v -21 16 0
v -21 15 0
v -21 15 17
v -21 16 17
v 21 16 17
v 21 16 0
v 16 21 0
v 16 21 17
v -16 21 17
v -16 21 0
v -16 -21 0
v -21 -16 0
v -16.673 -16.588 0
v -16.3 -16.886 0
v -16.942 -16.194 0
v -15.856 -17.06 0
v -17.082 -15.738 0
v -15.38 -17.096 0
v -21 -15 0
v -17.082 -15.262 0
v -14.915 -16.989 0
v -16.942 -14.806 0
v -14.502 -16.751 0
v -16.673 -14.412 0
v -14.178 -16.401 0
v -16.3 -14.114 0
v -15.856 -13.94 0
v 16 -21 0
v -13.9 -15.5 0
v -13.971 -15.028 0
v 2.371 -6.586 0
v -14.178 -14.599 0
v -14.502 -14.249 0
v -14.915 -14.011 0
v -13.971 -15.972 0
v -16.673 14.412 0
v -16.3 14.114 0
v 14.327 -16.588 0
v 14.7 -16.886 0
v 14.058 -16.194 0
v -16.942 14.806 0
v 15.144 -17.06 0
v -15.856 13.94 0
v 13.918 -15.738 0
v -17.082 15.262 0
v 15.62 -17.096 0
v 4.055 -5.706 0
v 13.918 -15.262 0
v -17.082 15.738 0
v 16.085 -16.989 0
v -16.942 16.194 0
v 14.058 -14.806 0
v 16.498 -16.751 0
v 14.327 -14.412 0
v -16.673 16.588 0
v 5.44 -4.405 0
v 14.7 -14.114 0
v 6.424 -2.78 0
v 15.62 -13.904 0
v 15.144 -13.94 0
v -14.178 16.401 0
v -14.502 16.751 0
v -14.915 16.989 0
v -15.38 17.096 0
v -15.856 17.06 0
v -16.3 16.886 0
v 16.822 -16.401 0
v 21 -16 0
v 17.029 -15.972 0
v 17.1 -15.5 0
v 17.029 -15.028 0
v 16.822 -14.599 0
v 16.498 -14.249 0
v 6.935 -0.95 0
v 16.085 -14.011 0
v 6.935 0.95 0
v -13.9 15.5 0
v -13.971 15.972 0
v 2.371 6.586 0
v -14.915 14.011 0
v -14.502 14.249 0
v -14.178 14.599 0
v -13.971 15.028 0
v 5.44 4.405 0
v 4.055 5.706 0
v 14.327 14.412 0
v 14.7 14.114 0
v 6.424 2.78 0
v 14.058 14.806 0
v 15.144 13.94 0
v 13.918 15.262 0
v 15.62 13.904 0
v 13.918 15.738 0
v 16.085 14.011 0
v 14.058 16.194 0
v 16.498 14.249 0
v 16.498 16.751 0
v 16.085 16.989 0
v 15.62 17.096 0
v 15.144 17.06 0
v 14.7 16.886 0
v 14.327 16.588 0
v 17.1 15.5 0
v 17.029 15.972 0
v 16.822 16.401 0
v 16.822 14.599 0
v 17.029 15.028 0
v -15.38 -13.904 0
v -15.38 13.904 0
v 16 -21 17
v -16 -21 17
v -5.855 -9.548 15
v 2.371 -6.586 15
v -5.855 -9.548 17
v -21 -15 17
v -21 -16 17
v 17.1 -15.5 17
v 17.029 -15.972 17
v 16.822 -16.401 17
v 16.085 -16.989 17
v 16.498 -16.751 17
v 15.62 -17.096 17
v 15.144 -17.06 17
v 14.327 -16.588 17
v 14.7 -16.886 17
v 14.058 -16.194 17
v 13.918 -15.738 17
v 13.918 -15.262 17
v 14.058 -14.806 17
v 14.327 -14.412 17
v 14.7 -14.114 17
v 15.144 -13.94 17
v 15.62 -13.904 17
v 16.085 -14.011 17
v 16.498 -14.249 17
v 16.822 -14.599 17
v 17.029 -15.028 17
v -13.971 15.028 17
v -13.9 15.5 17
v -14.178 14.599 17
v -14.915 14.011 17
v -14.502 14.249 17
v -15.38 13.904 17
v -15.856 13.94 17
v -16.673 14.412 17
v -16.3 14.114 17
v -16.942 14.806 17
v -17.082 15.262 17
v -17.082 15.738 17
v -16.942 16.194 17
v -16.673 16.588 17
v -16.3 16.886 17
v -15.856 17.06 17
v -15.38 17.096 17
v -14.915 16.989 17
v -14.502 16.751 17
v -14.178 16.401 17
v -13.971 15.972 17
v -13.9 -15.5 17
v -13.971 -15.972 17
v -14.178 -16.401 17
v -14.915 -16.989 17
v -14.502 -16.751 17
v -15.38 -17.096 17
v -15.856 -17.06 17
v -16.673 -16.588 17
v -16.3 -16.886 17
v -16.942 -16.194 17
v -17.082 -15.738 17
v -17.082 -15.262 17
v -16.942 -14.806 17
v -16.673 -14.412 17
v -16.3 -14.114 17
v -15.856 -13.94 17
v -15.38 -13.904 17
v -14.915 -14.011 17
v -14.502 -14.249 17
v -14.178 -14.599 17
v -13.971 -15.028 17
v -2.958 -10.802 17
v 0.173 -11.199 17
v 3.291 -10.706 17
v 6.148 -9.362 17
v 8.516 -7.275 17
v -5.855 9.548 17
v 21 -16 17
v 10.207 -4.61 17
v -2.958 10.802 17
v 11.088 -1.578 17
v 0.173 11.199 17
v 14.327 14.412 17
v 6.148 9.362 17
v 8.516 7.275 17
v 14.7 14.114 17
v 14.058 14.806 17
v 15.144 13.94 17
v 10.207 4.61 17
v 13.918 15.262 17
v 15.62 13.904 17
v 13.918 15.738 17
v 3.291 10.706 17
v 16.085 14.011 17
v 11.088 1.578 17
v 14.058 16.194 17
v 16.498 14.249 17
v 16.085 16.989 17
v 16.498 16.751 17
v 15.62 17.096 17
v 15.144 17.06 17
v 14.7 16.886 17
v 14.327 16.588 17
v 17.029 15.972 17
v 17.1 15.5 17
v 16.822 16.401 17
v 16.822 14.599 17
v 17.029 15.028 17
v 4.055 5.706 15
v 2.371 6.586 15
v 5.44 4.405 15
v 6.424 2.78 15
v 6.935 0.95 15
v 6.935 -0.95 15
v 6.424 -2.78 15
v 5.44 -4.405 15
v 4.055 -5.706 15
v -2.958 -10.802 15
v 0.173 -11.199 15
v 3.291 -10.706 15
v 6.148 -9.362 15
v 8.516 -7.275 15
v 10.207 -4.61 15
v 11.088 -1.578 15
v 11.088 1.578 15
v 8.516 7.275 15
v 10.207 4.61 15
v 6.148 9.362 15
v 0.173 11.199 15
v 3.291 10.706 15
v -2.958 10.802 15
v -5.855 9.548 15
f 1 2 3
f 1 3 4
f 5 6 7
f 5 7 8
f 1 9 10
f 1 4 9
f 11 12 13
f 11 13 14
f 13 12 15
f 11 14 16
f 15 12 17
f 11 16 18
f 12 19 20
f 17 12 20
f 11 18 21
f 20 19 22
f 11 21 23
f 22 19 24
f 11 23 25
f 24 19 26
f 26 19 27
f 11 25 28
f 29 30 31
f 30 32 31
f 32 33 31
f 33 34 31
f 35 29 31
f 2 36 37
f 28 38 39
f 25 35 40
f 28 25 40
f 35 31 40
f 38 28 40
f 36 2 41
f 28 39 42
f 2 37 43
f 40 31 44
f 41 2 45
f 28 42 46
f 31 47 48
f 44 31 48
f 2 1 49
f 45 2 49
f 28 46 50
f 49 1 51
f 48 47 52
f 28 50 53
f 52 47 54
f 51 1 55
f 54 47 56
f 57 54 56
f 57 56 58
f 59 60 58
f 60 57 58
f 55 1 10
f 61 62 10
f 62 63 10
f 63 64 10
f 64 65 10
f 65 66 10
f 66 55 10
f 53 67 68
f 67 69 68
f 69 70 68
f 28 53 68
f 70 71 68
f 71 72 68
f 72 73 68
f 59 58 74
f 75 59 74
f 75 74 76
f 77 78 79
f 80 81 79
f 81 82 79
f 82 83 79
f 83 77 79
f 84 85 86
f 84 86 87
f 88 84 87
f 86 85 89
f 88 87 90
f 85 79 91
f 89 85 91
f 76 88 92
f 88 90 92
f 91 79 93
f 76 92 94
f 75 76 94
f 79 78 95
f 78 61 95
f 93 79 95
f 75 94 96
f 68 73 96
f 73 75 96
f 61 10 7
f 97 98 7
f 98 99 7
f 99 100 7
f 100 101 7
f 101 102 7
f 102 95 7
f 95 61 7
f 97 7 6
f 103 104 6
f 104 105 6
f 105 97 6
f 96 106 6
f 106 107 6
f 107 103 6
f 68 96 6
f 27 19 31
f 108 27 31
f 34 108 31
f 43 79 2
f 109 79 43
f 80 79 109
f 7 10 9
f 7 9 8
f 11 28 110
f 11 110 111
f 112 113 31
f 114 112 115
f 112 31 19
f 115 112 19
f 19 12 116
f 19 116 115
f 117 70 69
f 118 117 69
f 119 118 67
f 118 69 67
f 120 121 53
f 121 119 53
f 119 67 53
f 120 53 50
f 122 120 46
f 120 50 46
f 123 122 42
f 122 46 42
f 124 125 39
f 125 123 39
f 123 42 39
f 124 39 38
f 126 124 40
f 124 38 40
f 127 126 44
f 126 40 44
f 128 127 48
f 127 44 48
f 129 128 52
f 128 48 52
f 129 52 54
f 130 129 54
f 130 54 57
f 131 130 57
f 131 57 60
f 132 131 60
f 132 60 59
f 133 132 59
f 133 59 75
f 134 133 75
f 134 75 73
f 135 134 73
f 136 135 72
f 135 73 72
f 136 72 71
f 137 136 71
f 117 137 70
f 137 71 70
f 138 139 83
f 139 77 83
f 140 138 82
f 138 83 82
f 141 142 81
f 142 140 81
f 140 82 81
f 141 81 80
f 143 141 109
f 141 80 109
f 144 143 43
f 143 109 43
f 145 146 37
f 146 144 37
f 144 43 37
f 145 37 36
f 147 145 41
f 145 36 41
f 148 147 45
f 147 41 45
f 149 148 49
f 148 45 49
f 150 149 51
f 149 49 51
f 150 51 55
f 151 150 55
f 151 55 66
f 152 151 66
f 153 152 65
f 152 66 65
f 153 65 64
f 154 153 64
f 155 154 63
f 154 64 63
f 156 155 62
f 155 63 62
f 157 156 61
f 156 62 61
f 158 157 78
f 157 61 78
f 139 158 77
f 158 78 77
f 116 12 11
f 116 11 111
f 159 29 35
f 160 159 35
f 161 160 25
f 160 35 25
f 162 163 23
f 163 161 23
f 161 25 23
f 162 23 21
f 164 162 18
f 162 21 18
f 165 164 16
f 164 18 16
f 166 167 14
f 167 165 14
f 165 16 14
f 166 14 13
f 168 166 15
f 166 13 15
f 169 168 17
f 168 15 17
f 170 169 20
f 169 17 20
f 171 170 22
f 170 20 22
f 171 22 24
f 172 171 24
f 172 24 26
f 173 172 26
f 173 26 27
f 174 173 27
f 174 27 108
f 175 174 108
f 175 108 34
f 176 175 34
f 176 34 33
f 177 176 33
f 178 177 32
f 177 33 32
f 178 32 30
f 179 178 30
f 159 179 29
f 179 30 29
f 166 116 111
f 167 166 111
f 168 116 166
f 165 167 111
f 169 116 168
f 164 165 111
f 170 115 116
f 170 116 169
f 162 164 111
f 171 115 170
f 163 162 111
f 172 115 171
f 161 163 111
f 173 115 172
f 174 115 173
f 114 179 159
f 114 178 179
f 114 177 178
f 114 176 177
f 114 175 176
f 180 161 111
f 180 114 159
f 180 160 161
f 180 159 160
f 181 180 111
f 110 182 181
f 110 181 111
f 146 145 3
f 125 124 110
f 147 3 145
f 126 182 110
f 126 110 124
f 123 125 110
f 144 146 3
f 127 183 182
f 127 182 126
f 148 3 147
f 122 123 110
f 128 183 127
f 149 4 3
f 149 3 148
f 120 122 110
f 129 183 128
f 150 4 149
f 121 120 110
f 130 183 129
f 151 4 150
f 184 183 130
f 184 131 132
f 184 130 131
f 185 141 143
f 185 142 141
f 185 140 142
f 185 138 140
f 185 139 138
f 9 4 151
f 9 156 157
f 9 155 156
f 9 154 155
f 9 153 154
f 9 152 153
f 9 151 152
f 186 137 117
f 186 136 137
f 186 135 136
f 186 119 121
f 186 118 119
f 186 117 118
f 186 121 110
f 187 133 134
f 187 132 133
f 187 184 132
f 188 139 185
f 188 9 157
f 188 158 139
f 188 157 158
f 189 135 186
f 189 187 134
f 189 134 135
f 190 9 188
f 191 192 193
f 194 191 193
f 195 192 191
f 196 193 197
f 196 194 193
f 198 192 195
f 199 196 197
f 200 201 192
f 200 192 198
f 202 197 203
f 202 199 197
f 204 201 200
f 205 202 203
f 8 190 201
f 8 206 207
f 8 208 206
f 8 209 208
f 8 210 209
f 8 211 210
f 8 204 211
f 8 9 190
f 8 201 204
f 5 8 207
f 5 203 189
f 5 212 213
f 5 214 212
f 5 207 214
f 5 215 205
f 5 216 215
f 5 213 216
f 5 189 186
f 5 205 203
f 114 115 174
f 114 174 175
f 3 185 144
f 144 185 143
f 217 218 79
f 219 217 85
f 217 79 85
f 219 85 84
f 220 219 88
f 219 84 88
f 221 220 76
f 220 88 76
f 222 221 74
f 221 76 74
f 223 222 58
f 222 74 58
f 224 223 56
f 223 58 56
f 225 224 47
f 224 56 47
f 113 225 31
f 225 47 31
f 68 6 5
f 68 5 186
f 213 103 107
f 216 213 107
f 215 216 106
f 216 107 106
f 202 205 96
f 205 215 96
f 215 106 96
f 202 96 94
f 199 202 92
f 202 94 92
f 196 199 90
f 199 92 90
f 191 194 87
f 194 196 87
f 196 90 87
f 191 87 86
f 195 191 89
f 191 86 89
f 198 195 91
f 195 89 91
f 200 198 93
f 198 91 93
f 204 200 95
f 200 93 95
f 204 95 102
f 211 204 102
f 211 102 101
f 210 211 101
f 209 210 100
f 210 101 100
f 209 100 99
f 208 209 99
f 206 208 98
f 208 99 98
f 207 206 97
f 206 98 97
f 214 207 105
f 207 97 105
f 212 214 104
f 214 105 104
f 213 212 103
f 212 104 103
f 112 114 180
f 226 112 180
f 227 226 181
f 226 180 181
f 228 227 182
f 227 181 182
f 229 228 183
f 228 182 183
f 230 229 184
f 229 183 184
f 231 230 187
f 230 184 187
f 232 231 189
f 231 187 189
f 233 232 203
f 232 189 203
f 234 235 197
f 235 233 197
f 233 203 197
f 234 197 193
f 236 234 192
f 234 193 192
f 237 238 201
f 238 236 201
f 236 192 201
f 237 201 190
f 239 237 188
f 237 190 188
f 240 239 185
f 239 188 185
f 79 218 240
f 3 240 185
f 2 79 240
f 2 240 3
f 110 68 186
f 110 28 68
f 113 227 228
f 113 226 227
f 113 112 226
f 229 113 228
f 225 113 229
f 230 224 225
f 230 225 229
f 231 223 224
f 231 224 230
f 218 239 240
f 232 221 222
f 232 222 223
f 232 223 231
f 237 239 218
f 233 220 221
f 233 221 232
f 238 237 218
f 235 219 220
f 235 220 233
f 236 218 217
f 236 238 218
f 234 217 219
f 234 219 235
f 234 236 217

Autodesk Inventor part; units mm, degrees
ref_plane "YZ Plane" through (0, 0, 0) normal (1, 0, 0) x (0, 1, 0)
ref_plane "XZ Plane" through (0, 0, 0) normal (0, 1, 0) x (-1, 0, 0)
ref_plane "XY Plane" through (0, 0, 0) normal (0, 0, 1) x (1, 0, 0)
sketch "Sketch1" plane through (0, 0, 0) normal (0, 0, 1) x (1, 0, 0)
  line L0 (-21, 21) -> (21, 21)
  line L1 (21, 21) -> (21, -21)
  line L2 (21, -21) -> (-21, -21)
  line L3 (-21, -21) -> (-21, -15)
  arc A0 (2.3711, -6.5862) -> (2.3711, 6.5862) centre (0, 0) ccw
  line L4 (2.3711, 6.5862) -> (-21, 15)
  line L5 (-21, 15) -> (-21, 21)
  line L6 (2.3711, -6.5862) -> (-21, -15)
  line L7 (0, -29.4) -> (0, 29.4) projected
  line L8 (-29.4, 0) -> (29.4, 0) projected
  circle A1 centre (-15.5, 15.5) radius 1.6
  circle A2 centre (15.5, 15.5) radius 1.6
  circle A3 centre (15.5, -15.5) radius 1.6
  circle A4 centre (-15.5, -15.5) radius 1.6
  dimension "d0" = 21
  dimension "d1" = 21
  dimension "d2" = 21
  dimension "d3" = 21
  dimension "d4" = 7
  dimension "d5" = 15.5
  dimension "d6" = 15.5
  dimension "d7" = 15.5
  dimension "d8" = 15.5
  dimension "d9" = 15.5
  dimension "d10" = 15.5
  dimension "d11" = 15.5
  dimension "d12" = 15.5
  dimension "d13" = 3.2
  dimension "d14" = 6
extrude "Extrusion1" add sketch "Sketch1" along normal blind 17 contours L0 L7 L4 L5 | L0 L1 L8 A0 L4 L7 | L1 L2 L7 L6 A0 L8 | L7 L2 L3 L6
chamfer "Chamfer1" distance 5 angle 45 4 edges at (-21, 21, 8.5) (-21, -21, 8.5) (21, 21, 8.5) (21, -21, 8.5)
sketch "Sketch2" plane through (0, 0, 17) normal (0, 0, 1) x (1, 0, 0)
  circle A0 centre (0, 0) radius 11.2
  dimension "d20" = 22.4
extrude "Extrusion2" cut sketch "Sketch2" against normal blind 2
properties part number "motor_spacer"
